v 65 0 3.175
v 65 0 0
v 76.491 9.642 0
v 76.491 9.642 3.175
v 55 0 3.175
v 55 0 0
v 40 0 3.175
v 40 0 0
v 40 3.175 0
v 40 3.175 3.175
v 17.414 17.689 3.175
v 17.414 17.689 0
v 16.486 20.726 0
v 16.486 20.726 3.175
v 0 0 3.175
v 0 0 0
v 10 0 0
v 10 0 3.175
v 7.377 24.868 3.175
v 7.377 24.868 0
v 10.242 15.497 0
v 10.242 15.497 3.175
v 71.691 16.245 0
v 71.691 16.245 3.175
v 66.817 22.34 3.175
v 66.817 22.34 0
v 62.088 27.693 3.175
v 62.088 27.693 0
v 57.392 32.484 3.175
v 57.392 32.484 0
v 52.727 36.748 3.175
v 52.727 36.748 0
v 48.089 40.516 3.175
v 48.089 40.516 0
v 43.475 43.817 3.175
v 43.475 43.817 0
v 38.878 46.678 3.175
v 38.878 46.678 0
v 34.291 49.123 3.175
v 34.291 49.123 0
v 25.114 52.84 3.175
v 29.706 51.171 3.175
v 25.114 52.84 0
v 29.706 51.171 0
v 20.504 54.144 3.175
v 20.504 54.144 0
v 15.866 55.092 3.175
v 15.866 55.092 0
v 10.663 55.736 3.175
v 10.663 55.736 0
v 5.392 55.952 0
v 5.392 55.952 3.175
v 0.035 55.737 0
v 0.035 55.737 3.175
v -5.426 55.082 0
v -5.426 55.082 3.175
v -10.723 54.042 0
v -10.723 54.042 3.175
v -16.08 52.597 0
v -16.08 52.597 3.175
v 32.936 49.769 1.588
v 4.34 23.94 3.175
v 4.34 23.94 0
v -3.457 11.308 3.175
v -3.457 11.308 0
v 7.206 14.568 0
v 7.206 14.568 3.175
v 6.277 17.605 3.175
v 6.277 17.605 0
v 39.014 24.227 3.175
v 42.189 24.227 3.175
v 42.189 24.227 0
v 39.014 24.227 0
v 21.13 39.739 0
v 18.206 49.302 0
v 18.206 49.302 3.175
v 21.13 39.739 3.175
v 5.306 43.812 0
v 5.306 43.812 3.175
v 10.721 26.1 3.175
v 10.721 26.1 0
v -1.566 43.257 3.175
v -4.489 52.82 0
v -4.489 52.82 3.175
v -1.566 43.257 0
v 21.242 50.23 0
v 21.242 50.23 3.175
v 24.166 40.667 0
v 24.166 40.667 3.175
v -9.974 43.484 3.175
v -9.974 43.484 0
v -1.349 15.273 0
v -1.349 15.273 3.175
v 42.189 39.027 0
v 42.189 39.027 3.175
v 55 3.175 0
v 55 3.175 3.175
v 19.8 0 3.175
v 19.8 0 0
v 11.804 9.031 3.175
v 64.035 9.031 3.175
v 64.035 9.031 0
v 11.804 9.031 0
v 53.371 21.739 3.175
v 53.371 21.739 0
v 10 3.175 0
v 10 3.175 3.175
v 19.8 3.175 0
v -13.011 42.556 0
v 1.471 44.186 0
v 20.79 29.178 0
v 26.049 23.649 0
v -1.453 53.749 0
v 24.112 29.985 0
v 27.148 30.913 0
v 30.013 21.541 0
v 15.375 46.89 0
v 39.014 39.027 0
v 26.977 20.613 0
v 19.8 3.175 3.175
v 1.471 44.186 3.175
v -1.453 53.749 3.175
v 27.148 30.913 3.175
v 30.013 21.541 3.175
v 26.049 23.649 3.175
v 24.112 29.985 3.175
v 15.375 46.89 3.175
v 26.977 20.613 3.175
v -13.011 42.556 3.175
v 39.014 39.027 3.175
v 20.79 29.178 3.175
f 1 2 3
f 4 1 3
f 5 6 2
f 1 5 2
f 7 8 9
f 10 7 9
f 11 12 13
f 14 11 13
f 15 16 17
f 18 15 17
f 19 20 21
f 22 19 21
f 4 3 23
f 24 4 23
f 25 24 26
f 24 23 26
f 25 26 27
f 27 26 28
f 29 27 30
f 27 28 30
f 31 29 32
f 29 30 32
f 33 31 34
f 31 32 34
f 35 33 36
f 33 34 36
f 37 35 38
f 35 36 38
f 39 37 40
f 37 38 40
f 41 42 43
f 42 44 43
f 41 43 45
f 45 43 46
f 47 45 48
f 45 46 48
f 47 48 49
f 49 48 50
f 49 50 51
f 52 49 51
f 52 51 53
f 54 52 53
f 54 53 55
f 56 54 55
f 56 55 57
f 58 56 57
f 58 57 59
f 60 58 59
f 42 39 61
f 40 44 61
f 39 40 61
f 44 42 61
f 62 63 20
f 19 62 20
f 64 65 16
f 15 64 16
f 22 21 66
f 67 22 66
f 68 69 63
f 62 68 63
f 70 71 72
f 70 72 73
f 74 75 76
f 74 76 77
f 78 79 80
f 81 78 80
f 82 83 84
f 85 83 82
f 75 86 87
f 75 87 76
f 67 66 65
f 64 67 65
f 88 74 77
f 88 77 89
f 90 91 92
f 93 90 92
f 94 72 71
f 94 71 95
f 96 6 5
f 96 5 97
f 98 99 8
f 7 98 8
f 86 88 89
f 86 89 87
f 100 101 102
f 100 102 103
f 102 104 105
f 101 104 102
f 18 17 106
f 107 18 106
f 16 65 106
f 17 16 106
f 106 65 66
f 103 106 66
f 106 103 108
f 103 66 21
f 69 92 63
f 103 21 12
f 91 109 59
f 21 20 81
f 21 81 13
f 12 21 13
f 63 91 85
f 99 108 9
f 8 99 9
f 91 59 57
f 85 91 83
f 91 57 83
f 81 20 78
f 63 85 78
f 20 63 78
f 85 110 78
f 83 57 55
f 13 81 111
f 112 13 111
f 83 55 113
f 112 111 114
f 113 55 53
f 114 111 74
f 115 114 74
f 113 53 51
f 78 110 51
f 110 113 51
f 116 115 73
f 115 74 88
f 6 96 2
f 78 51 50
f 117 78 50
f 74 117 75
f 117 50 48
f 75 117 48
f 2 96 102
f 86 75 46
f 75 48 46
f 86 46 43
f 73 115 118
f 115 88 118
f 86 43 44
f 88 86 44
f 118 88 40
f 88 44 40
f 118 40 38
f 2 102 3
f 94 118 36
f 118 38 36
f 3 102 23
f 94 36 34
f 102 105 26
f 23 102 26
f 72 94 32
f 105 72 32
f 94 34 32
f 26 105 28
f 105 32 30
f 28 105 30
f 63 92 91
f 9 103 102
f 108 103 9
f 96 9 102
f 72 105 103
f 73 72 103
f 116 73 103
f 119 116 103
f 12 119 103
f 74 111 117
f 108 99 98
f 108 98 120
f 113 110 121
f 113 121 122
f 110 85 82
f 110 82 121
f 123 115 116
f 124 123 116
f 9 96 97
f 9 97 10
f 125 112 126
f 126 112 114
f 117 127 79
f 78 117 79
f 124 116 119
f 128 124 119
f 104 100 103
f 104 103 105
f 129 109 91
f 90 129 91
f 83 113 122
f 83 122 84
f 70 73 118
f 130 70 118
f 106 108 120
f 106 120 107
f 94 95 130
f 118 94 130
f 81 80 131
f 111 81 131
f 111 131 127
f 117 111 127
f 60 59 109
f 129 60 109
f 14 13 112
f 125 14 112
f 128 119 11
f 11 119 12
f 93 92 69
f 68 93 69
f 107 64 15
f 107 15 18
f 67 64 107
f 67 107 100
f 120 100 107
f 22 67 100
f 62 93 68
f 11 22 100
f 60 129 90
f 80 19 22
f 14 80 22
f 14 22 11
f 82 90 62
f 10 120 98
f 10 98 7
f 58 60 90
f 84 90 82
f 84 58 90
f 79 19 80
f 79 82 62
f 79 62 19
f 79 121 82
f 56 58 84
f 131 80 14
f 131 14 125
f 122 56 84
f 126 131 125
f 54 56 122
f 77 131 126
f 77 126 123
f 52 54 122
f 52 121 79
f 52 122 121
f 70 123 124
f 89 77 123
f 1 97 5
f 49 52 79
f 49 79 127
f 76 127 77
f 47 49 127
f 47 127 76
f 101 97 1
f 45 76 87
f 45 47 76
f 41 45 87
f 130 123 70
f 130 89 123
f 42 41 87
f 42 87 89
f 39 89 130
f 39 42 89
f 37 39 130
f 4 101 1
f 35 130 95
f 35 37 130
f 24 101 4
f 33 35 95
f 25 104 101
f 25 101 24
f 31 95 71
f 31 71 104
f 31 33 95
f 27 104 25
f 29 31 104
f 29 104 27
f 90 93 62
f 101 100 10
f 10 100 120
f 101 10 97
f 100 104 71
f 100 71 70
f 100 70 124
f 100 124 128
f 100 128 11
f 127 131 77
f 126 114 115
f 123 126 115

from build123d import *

# Parameters (mm, degrees)
BOSS_EXTRUDE1_DEPTH = 3.175
SKETCH3_W           = 3.175
SKETCH3_H           = 14.8
CUT_EXTRUDE1_DEPTH  = 4.1750001
SKETCH4_W           = 9.8
SKETCH4_H           = 3.175
SKETCH4_W_2         = 15
CUT_EXTRUDE2_DEPTH  = 3.175
CUT_EXTRUDE3_DEPTH  = 4.1750001


with BuildPart() as part:
    # Sketch1 → Boss-Extrude1 (new body)
    with BuildSketch(Plane.XY):
        with BuildLine():
            Line((0, 0), (65, 0))
            Line((65, 0), (76.490666647, 9.641814145))
            add(Edge.make_bspline(
                [(76.490666647, 9.641814145), (35.667607653, 68.4177286), (-16.08044376, 52.596761578)],
                knots=[0, 0, 0, 1, 1, 1], degree=2))
            Line((-16.08044376, 52.596761578), (0, 0))
        make_face()
    extrude(amount=BOSS_EXTRUDE1_DEPTH)

    # Sketch3 → Cut-Extrude1 (cut, through all)
    with BuildSketch(Plane(origin=(0, 0, 0), x_dir=(-1, 0, 0), z_dir=(0, 0, -1))):
        with Locations((-40.601722956, 31.627041635)):
            Rectangle(SKETCH3_W, SKETCH3_H)
        Polygon((-24.165936956, 40.667408524), (-21.242219909, 50.230456083), (-18.205952308, 49.302175921), (-21.129669356, 39.739128361), align=None)
        Polygon((-24.111860744, 29.984819851), (-27.148128344, 30.913100013), (-30.01337105, 21.541313405), (-26.97710345, 20.613033242), align=None)
        Polygon((-26.048823288, 23.649300842), (-26.97710345, 20.613033242), (-17.414055891, 17.689316195), (-16.485775728, 20.725583795), align=None)
        Polygon((-1.470619079, 44.185671088), (1.453097968, 53.748718648), (4.489365568, 52.820438485), (1.565648521, 43.257390926), align=None)
        Polygon((-10.241770221, 15.496528409), (-7.205502621, 14.568248247), (-6.277222458, 17.604515847), (-4.340259914, 23.940034855), (-7.376527515, 24.868315018), align=None)
        Polygon((-7.205502621, 14.568248247), (3.457295408, 11.308303739), (4.385575571, 14.344571339), (-6.277222458, 17.604515847), align=None)
    extrude(amount=-CUT_EXTRUDE1_DEPTH, mode=Mode.SUBTRACT)

    # Sketch4 → Cut-Extrude2 (cut)
    with BuildSketch(Plane(origin=(0, 0, 0), x_dir=(-1, 0, 0), z_dir=(0, 0, -1))):
        with Locations((-14.9, 1.5875)):
            Rectangle(SKETCH4_W, SKETCH4_H)
        with Locations((-47.5, 1.5875)):
            Rectangle(SKETCH4_W_2, SKETCH4_H)
        Polygon((13.01054086, 42.55556164), (9.97427326, 43.483841803), (1.349307971, 15.272851502), (4.385575571, 14.344571339), align=None)
    extrude(amount=-CUT_EXTRUDE2_DEPTH, mode=Mode.SUBTRACT)

    # Sketch5 → Cut-Extrude3 (cut, through all)
    with BuildSketch(Plane.XY.offset(3.175)):
        Polygon((11.804307663, 9.030936103), (53.371240129, 21.739222692), (64.034758718, 9.030936103), align=None)
        Polygon((5.306009056, 43.811965436), (10.721102585, 26.099992585), (20.789996423, 29.178362359), (15.374902893, 46.890335211), align=None)
    extrude(amount=-CUT_EXTRUDE3_DEPTH, mode=Mode.SUBTRACT)


solid = part.part
